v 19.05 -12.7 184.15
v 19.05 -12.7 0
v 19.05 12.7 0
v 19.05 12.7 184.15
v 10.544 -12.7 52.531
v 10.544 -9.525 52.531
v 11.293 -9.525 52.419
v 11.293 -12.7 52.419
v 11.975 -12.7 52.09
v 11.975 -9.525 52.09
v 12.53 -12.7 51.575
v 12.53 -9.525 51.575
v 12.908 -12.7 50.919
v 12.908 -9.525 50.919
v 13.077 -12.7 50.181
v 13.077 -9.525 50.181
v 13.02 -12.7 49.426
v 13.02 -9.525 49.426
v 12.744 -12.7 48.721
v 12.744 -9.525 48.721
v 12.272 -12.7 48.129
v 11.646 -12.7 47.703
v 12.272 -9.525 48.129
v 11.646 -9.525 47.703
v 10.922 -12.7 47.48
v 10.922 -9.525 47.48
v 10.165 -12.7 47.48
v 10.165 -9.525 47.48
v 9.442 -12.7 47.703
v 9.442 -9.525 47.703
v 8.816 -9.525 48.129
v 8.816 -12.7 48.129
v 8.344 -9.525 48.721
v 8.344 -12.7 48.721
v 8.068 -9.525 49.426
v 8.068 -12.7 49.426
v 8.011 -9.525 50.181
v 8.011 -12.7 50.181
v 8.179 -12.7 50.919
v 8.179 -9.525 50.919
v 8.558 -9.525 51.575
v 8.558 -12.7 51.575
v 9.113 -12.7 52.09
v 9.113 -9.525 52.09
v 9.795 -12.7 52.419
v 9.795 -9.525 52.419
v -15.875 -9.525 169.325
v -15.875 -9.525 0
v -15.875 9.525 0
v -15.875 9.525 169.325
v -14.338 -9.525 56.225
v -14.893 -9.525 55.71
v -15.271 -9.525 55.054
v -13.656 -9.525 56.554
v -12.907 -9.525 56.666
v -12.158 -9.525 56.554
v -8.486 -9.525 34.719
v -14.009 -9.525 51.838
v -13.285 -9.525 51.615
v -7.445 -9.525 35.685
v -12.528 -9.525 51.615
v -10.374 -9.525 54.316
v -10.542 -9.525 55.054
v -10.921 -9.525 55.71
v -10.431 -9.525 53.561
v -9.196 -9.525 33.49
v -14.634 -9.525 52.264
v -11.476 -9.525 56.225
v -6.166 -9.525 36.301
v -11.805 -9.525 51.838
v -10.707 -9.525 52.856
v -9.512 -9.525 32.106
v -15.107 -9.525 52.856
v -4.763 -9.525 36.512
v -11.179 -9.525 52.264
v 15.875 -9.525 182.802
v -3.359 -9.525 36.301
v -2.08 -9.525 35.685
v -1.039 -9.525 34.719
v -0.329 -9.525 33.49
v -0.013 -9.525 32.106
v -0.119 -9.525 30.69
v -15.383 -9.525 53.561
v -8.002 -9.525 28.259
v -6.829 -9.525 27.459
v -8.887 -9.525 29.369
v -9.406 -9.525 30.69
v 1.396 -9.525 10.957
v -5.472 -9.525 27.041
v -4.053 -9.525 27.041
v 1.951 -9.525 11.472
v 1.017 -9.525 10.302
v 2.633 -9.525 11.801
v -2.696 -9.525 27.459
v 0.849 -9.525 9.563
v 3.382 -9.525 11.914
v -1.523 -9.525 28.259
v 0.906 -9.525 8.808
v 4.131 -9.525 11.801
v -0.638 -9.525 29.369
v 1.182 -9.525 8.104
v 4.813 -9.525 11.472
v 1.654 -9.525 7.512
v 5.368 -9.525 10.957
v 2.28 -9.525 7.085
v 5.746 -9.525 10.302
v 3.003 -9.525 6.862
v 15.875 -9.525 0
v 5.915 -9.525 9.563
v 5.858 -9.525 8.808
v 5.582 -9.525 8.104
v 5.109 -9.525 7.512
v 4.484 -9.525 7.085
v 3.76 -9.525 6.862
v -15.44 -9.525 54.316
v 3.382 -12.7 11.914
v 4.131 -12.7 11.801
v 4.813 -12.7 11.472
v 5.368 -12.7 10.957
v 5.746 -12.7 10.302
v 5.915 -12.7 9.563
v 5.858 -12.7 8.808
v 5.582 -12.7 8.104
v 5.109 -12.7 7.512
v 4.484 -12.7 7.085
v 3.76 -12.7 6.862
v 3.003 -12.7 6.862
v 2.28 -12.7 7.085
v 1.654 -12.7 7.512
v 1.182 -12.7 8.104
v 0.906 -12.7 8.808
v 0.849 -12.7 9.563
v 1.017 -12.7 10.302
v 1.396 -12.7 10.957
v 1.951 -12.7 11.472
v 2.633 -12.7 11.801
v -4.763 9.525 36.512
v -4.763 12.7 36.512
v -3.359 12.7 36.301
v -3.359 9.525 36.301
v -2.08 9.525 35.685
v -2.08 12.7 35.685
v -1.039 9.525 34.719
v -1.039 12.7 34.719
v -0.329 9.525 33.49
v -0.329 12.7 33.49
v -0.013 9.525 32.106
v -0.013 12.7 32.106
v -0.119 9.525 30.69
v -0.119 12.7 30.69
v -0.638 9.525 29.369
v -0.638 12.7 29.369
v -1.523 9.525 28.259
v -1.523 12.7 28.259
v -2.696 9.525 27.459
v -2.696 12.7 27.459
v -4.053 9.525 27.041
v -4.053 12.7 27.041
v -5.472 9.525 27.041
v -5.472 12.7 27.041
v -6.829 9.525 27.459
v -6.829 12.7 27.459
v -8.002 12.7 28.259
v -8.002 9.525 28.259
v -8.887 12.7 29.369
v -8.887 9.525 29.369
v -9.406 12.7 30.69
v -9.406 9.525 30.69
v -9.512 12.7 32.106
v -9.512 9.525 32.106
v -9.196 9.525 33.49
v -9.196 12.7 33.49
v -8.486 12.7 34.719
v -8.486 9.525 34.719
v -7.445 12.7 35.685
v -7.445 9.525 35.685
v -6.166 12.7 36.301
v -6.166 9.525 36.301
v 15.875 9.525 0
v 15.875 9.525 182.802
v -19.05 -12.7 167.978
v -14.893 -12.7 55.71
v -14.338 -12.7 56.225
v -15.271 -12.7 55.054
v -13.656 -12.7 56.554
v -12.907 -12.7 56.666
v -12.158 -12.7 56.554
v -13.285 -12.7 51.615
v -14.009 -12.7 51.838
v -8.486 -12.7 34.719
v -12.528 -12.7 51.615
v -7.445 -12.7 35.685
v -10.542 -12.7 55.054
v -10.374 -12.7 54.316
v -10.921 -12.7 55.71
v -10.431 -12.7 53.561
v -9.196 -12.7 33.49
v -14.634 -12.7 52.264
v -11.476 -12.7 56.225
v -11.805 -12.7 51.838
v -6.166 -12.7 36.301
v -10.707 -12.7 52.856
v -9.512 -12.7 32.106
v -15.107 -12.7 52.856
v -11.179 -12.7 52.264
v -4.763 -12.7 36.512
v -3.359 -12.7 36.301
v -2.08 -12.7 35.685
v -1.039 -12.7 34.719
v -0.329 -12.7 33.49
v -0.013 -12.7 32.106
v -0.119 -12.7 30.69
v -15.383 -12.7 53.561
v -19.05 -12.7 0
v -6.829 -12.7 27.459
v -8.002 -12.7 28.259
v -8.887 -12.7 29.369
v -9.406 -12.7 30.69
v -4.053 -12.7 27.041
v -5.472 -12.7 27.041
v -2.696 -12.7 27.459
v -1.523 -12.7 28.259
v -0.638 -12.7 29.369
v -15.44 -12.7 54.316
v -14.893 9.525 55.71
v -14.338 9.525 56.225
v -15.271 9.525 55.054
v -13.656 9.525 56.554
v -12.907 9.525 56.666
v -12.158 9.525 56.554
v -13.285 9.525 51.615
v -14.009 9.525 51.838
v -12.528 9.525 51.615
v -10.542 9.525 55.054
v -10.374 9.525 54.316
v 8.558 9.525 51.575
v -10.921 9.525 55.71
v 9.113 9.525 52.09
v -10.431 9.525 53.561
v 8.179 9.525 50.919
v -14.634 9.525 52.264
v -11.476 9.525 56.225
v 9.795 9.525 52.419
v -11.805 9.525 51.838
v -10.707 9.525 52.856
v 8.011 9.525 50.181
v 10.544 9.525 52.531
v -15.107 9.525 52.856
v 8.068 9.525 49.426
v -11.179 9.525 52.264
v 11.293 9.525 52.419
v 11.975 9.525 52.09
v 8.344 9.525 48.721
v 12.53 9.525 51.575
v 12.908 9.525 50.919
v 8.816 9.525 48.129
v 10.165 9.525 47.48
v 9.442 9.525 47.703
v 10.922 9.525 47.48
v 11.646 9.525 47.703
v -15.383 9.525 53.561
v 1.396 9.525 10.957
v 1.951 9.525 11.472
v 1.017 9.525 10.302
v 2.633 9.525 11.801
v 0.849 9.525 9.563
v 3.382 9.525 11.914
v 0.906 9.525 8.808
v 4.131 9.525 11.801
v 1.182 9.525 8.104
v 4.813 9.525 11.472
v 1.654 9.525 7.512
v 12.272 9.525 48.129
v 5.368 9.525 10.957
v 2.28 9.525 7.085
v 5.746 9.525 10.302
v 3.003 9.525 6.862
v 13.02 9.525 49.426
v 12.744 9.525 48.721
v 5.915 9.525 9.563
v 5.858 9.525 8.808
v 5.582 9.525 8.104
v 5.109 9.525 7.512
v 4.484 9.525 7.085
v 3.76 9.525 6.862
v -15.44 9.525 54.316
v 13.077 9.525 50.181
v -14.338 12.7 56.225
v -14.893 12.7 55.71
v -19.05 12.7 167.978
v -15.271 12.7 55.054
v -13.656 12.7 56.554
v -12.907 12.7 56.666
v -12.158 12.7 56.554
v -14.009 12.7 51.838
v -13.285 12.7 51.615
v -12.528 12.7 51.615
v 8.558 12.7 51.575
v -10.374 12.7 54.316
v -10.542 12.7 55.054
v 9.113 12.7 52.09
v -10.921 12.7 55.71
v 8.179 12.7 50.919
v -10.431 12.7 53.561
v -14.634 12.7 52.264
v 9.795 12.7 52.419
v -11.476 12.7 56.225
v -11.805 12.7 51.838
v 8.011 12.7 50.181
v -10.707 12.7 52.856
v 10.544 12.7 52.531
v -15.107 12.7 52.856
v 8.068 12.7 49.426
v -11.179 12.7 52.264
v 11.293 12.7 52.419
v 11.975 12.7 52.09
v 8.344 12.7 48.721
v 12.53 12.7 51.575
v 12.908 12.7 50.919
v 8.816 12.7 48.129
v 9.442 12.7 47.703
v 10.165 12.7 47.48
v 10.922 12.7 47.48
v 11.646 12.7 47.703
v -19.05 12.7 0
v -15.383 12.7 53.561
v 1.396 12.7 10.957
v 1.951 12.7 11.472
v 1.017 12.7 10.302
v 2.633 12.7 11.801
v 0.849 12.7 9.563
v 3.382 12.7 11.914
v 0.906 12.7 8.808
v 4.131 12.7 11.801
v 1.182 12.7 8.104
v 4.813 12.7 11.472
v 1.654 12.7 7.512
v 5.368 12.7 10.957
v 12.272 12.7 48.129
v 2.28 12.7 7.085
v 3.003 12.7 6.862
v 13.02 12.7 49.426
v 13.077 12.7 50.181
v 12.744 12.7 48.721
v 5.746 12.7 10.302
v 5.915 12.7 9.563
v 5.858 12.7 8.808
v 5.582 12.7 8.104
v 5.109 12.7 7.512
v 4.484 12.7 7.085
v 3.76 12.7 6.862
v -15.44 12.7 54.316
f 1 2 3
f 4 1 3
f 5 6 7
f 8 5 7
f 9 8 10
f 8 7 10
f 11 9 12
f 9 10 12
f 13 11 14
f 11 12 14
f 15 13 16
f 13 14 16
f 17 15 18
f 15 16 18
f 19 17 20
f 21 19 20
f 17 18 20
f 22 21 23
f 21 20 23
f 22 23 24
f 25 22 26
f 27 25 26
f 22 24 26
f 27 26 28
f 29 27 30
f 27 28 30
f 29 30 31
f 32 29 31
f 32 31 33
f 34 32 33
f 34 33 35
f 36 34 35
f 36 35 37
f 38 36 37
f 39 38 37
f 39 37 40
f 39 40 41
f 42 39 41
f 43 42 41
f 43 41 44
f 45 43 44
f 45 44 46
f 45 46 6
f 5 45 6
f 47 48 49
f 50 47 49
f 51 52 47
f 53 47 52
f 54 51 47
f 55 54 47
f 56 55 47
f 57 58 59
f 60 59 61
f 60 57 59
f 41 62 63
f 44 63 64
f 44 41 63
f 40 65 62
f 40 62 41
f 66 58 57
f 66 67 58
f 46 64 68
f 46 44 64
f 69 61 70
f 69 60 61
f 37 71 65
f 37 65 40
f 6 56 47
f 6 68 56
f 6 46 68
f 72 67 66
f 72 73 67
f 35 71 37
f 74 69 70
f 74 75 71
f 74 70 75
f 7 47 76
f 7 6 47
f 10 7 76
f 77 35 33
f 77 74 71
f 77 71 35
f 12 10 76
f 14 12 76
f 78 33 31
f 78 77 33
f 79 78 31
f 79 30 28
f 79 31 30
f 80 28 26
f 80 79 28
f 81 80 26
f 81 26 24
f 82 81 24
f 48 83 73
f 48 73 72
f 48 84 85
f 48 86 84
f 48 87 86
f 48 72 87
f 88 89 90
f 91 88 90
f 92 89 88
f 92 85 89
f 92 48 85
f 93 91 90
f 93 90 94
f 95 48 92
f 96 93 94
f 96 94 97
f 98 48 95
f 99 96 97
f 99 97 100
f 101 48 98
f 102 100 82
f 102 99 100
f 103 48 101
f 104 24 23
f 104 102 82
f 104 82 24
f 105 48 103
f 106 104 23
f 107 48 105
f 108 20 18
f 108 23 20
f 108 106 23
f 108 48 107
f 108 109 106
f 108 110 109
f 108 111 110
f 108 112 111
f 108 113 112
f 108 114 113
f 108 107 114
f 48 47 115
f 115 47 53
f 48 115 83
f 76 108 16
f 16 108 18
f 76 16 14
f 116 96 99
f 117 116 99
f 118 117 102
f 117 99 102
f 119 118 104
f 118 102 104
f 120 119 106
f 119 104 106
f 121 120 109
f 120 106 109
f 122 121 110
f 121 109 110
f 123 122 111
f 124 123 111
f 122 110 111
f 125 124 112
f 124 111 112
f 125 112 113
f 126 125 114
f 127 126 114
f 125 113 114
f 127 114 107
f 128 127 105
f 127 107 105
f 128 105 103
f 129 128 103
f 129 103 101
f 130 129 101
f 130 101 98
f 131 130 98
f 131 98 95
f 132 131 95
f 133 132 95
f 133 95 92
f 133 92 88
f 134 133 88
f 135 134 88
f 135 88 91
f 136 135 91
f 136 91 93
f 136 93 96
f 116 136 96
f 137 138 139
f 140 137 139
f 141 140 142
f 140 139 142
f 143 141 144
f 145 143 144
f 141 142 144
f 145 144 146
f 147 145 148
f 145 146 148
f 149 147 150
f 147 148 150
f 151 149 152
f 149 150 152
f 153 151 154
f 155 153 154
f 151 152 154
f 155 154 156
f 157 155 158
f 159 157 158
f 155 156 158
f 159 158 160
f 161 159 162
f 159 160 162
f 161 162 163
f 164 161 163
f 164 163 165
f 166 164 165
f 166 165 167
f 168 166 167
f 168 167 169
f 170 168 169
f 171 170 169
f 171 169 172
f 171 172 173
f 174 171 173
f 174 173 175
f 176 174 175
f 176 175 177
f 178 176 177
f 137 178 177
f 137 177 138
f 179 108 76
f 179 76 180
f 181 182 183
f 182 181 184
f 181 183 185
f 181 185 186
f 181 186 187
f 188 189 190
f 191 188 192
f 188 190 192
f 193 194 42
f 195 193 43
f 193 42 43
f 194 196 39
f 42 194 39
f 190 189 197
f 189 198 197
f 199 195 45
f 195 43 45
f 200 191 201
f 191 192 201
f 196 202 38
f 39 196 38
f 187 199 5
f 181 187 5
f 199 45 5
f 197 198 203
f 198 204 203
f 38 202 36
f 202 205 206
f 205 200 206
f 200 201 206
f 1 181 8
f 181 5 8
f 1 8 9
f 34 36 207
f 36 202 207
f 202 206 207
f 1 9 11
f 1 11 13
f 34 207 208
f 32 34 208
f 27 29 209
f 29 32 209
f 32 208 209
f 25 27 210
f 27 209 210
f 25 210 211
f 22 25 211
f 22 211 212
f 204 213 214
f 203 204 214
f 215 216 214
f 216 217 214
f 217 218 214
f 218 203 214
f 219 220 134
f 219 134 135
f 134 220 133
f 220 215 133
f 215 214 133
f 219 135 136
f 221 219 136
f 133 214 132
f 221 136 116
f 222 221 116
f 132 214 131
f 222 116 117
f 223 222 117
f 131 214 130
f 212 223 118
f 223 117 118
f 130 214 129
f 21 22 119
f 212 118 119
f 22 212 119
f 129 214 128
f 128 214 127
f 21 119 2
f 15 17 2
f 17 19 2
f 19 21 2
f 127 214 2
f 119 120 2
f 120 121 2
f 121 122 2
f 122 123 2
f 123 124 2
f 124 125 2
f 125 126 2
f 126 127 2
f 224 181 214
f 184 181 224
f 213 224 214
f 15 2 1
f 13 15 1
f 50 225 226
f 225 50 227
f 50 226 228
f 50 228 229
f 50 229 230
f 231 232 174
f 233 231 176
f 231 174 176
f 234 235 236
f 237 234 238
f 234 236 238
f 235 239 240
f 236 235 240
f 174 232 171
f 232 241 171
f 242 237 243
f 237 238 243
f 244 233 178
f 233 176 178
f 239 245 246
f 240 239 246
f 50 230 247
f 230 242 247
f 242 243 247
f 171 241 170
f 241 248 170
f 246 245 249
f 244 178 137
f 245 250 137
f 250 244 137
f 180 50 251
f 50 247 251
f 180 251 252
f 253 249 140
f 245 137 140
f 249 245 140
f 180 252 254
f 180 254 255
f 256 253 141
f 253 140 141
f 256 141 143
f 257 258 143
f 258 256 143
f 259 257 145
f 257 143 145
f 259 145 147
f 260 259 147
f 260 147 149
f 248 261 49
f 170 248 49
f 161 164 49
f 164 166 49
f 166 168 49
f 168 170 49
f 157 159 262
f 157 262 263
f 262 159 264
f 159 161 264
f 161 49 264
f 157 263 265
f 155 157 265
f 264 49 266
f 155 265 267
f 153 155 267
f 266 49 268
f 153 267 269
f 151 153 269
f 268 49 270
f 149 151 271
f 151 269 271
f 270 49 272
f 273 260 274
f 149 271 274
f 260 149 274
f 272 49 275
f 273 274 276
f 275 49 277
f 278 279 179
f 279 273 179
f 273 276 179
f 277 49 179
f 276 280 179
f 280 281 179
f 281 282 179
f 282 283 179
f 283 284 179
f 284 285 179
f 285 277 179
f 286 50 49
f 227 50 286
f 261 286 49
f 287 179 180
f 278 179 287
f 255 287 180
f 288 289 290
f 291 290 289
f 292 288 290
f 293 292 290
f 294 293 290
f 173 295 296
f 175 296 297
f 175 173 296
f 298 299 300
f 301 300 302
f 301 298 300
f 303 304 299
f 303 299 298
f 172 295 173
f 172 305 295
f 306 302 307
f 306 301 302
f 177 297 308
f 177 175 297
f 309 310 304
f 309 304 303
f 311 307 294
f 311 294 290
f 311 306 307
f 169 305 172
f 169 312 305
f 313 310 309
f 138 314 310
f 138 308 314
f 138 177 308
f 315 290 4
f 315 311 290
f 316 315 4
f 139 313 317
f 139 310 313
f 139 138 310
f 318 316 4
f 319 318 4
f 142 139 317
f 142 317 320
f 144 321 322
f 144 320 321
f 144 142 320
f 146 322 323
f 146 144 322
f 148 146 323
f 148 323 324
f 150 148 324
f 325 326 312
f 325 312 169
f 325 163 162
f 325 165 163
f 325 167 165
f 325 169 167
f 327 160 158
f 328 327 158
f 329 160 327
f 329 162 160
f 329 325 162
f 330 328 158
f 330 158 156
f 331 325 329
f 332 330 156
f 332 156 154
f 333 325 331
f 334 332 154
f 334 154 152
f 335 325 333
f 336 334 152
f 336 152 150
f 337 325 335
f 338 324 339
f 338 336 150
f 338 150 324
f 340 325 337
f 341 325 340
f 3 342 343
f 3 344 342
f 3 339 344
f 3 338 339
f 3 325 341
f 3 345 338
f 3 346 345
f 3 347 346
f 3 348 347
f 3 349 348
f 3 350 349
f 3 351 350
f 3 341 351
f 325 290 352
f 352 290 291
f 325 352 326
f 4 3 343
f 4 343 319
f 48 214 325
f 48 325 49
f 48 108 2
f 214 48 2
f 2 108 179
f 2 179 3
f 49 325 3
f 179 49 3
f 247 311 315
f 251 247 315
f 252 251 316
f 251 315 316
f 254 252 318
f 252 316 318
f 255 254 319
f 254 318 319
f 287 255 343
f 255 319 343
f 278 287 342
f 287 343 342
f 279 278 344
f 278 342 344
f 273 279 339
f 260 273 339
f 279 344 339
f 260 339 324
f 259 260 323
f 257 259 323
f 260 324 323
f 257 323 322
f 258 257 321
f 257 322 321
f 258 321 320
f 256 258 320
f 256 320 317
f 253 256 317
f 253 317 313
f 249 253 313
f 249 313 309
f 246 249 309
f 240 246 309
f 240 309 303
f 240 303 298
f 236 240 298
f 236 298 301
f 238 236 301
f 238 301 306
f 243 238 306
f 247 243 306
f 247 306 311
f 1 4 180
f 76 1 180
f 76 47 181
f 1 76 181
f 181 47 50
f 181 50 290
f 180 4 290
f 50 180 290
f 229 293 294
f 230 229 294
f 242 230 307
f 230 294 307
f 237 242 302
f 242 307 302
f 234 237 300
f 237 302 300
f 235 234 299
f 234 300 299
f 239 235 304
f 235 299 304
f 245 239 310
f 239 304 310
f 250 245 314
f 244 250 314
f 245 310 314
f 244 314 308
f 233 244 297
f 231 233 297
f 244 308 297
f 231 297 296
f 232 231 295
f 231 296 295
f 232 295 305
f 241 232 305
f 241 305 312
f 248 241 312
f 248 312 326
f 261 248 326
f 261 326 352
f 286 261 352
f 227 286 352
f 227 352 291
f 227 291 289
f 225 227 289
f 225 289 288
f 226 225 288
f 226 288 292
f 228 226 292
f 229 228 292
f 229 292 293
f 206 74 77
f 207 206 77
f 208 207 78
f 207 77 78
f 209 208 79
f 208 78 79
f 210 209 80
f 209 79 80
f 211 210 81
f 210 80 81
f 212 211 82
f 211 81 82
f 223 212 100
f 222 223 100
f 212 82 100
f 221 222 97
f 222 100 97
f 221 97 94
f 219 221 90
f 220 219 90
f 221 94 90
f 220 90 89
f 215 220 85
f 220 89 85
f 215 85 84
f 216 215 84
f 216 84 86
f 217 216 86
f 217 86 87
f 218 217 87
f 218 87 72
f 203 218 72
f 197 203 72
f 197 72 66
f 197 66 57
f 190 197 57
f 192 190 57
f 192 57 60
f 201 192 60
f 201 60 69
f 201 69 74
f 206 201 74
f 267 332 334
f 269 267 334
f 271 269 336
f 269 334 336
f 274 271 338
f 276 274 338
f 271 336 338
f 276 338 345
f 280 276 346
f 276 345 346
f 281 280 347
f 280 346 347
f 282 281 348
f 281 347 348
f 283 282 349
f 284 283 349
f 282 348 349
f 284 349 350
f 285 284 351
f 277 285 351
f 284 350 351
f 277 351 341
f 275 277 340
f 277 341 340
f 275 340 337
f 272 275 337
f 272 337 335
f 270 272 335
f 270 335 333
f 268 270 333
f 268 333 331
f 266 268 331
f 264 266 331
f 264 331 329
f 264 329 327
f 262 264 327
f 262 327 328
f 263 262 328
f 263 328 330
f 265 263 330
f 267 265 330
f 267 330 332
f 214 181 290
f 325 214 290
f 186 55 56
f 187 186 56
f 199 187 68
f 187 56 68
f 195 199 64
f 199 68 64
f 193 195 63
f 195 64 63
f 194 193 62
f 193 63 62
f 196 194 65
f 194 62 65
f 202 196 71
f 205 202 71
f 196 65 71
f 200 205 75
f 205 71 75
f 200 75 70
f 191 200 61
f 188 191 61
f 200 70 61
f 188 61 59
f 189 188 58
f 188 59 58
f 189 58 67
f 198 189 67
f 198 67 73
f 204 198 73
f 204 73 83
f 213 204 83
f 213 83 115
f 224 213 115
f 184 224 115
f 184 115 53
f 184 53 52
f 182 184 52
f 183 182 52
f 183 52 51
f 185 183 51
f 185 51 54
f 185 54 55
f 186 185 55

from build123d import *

# Parameters (mm, degrees)
SKETCH1_W           = 38.1
SKETCH1_H           = 25.4
SKETCH1_W_2         = 31.75
SKETCH1_H_2         = 19.05
BOSS_EXTRUDE1_DEPTH = 184.15
CUT_EXTRUDE1_REACH  = 188.867
CUT_EXTRUDE2_REACH  = 188.867
SKETCH3_R           = 4.7625
SKETCH3_R_2         = 2.54


with BuildPart() as part:
    # Sketch1 → Boss-Extrude1 (new body)
    with BuildSketch(Plane.XY):
        Rectangle(SKETCH1_W, SKETCH1_H)
        Rectangle(SKETCH1_W_2, SKETCH1_H_2, mode=Mode.SUBTRACT)
    extrude(amount=BOSS_EXTRUDE1_DEPTH)

    # Cut-Extrude1: up to this face of the body (flat: up to its plane)
    cut_extrude1_end = Plane(part.part.faces().sort_by_distance((0, -12.7, 92.075))[0])
    # Sketch2 → Cut-Extrude1 (cut, up to the picked face)
    with BuildSketch(Plane(origin=(0, 12.7, 0), x_dir=(1, 0, 0), z_dir=(0, 1, 0)), mode=Mode.PRIVATE) as cut_extrude1_sk1:
        Polygon((19.05, -184.15), (-19.05, -167.977509502), (-19.05, -184.15), align=None)
    cut_extrude1_tool1 = split(extrude(cut_extrude1_sk1.sketch, amount=-CUT_EXTRUDE1_REACH, mode=Mode.PRIVATE), bisect_by=cut_extrude1_end, keep=Keep.BOTH, mode=Mode.PRIVATE)
    add(cut_extrude1_tool1.solids().sort_by(Axis((-6.35, 12.7, 178.75917), (0, -1, 0)))[0], mode=Mode.SUBTRACT)

    # Cut-Extrude2: up to this face of the body (flat: up to its plane)
    cut_extrude2_end = Plane(part.part.faces().sort_by_distance((0.291642408, -12.7, 88.093774804))[0])
    # Sketch3 → Cut-Extrude2 (cut, up to the picked face)
    with BuildSketch(Plane(origin=(0, 12.7, 0), x_dir=(1, 0, 0), z_dir=(0, 1, 0)), mode=Mode.PRIVATE) as cut_extrude2_sk1:
        with Locations(Location((-4.7625, -31.75, 0), (0, 0, 270))):
            Circle(SKETCH3_R)
    cut_extrude2_tool1 = split(extrude(cut_extrude2_sk1.sketch, amount=-CUT_EXTRUDE2_REACH, mode=Mode.PRIVATE), bisect_by=cut_extrude2_end, keep=Keep.BOTH, mode=Mode.PRIVATE)
    # Sketch3 → Cut-Extrude2 (cut, up to the picked face)
    with BuildSketch(Plane(origin=(0, 12.7, 0), x_dir=(1, 0, 0), z_dir=(0, 1, 0)), mode=Mode.PRIVATE) as cut_extrude2_sk2:
        with Locations(Location((-12.906854663, -54.126430532, 0), (0, 0, 270))):
            Circle(SKETCH3_R_2)
    cut_extrude2_tool2 = split(extrude(cut_extrude2_sk2.sketch, amount=-CUT_EXTRUDE2_REACH, mode=Mode.PRIVATE), bisect_by=cut_extrude2_end, keep=Keep.BOTH, mode=Mode.PRIVATE)
    # Sketch3 → Cut-Extrude2 (cut, up to the picked face)
    with BuildSketch(Plane(origin=(0, 12.7, 0), x_dir=(1, 0, 0), z_dir=(0, 1, 0)), mode=Mode.PRIVATE) as cut_extrude2_sk3:
        with Locations(Location((3.381854663, -9.373569468, 0), (0, 0, 270))):
            Circle(SKETCH3_R_2)
    cut_extrude2_tool3 = split(extrude(cut_extrude2_sk3.sketch, amount=-CUT_EXTRUDE2_REACH, mode=Mode.PRIVATE), bisect_by=cut_extrude2_end, keep=Keep.BOTH, mode=Mode.PRIVATE)
    # Sketch3 → Cut-Extrude2 (cut, up to the picked face)
    with BuildSketch(Plane(origin=(0, 12.7, 0), x_dir=(1, 0, 0), z_dir=(0, 1, 0)), mode=Mode.PRIVATE) as cut_extrude2_sk4:
        with Locations(Location((10.543879956, -49.991433302, 0), (0, 0, 270))):
            Circle(SKETCH3_R_2)
    cut_extrude2_tool4 = split(extrude(cut_extrude2_sk4.sketch, amount=-CUT_EXTRUDE2_REACH, mode=Mode.PRIVATE), bisect_by=cut_extrude2_end, keep=Keep.BOTH, mode=Mode.PRIVATE)
    add(cut_extrude2_tool1.solids().sort_by(Axis((-4.7625, 12.7, 31.75), (0, -1, 0)))[0], mode=Mode.SUBTRACT)
    add(cut_extrude2_tool2.solids().sort_by(Axis((-12.906855, 12.7, 54.126431), (0, -1, 0)))[0], mode=Mode.SUBTRACT)
    add(cut_extrude2_tool3.solids().sort_by(Axis((3.381855, 12.7, 9.373569), (0, -1, 0)))[0], mode=Mode.SUBTRACT)
    add(cut_extrude2_tool4.solids().sort_by(Axis((10.54388, 12.7, 49.991433), (0, -1, 0)))[0], mode=Mode.SUBTRACT)


solid = part.part
